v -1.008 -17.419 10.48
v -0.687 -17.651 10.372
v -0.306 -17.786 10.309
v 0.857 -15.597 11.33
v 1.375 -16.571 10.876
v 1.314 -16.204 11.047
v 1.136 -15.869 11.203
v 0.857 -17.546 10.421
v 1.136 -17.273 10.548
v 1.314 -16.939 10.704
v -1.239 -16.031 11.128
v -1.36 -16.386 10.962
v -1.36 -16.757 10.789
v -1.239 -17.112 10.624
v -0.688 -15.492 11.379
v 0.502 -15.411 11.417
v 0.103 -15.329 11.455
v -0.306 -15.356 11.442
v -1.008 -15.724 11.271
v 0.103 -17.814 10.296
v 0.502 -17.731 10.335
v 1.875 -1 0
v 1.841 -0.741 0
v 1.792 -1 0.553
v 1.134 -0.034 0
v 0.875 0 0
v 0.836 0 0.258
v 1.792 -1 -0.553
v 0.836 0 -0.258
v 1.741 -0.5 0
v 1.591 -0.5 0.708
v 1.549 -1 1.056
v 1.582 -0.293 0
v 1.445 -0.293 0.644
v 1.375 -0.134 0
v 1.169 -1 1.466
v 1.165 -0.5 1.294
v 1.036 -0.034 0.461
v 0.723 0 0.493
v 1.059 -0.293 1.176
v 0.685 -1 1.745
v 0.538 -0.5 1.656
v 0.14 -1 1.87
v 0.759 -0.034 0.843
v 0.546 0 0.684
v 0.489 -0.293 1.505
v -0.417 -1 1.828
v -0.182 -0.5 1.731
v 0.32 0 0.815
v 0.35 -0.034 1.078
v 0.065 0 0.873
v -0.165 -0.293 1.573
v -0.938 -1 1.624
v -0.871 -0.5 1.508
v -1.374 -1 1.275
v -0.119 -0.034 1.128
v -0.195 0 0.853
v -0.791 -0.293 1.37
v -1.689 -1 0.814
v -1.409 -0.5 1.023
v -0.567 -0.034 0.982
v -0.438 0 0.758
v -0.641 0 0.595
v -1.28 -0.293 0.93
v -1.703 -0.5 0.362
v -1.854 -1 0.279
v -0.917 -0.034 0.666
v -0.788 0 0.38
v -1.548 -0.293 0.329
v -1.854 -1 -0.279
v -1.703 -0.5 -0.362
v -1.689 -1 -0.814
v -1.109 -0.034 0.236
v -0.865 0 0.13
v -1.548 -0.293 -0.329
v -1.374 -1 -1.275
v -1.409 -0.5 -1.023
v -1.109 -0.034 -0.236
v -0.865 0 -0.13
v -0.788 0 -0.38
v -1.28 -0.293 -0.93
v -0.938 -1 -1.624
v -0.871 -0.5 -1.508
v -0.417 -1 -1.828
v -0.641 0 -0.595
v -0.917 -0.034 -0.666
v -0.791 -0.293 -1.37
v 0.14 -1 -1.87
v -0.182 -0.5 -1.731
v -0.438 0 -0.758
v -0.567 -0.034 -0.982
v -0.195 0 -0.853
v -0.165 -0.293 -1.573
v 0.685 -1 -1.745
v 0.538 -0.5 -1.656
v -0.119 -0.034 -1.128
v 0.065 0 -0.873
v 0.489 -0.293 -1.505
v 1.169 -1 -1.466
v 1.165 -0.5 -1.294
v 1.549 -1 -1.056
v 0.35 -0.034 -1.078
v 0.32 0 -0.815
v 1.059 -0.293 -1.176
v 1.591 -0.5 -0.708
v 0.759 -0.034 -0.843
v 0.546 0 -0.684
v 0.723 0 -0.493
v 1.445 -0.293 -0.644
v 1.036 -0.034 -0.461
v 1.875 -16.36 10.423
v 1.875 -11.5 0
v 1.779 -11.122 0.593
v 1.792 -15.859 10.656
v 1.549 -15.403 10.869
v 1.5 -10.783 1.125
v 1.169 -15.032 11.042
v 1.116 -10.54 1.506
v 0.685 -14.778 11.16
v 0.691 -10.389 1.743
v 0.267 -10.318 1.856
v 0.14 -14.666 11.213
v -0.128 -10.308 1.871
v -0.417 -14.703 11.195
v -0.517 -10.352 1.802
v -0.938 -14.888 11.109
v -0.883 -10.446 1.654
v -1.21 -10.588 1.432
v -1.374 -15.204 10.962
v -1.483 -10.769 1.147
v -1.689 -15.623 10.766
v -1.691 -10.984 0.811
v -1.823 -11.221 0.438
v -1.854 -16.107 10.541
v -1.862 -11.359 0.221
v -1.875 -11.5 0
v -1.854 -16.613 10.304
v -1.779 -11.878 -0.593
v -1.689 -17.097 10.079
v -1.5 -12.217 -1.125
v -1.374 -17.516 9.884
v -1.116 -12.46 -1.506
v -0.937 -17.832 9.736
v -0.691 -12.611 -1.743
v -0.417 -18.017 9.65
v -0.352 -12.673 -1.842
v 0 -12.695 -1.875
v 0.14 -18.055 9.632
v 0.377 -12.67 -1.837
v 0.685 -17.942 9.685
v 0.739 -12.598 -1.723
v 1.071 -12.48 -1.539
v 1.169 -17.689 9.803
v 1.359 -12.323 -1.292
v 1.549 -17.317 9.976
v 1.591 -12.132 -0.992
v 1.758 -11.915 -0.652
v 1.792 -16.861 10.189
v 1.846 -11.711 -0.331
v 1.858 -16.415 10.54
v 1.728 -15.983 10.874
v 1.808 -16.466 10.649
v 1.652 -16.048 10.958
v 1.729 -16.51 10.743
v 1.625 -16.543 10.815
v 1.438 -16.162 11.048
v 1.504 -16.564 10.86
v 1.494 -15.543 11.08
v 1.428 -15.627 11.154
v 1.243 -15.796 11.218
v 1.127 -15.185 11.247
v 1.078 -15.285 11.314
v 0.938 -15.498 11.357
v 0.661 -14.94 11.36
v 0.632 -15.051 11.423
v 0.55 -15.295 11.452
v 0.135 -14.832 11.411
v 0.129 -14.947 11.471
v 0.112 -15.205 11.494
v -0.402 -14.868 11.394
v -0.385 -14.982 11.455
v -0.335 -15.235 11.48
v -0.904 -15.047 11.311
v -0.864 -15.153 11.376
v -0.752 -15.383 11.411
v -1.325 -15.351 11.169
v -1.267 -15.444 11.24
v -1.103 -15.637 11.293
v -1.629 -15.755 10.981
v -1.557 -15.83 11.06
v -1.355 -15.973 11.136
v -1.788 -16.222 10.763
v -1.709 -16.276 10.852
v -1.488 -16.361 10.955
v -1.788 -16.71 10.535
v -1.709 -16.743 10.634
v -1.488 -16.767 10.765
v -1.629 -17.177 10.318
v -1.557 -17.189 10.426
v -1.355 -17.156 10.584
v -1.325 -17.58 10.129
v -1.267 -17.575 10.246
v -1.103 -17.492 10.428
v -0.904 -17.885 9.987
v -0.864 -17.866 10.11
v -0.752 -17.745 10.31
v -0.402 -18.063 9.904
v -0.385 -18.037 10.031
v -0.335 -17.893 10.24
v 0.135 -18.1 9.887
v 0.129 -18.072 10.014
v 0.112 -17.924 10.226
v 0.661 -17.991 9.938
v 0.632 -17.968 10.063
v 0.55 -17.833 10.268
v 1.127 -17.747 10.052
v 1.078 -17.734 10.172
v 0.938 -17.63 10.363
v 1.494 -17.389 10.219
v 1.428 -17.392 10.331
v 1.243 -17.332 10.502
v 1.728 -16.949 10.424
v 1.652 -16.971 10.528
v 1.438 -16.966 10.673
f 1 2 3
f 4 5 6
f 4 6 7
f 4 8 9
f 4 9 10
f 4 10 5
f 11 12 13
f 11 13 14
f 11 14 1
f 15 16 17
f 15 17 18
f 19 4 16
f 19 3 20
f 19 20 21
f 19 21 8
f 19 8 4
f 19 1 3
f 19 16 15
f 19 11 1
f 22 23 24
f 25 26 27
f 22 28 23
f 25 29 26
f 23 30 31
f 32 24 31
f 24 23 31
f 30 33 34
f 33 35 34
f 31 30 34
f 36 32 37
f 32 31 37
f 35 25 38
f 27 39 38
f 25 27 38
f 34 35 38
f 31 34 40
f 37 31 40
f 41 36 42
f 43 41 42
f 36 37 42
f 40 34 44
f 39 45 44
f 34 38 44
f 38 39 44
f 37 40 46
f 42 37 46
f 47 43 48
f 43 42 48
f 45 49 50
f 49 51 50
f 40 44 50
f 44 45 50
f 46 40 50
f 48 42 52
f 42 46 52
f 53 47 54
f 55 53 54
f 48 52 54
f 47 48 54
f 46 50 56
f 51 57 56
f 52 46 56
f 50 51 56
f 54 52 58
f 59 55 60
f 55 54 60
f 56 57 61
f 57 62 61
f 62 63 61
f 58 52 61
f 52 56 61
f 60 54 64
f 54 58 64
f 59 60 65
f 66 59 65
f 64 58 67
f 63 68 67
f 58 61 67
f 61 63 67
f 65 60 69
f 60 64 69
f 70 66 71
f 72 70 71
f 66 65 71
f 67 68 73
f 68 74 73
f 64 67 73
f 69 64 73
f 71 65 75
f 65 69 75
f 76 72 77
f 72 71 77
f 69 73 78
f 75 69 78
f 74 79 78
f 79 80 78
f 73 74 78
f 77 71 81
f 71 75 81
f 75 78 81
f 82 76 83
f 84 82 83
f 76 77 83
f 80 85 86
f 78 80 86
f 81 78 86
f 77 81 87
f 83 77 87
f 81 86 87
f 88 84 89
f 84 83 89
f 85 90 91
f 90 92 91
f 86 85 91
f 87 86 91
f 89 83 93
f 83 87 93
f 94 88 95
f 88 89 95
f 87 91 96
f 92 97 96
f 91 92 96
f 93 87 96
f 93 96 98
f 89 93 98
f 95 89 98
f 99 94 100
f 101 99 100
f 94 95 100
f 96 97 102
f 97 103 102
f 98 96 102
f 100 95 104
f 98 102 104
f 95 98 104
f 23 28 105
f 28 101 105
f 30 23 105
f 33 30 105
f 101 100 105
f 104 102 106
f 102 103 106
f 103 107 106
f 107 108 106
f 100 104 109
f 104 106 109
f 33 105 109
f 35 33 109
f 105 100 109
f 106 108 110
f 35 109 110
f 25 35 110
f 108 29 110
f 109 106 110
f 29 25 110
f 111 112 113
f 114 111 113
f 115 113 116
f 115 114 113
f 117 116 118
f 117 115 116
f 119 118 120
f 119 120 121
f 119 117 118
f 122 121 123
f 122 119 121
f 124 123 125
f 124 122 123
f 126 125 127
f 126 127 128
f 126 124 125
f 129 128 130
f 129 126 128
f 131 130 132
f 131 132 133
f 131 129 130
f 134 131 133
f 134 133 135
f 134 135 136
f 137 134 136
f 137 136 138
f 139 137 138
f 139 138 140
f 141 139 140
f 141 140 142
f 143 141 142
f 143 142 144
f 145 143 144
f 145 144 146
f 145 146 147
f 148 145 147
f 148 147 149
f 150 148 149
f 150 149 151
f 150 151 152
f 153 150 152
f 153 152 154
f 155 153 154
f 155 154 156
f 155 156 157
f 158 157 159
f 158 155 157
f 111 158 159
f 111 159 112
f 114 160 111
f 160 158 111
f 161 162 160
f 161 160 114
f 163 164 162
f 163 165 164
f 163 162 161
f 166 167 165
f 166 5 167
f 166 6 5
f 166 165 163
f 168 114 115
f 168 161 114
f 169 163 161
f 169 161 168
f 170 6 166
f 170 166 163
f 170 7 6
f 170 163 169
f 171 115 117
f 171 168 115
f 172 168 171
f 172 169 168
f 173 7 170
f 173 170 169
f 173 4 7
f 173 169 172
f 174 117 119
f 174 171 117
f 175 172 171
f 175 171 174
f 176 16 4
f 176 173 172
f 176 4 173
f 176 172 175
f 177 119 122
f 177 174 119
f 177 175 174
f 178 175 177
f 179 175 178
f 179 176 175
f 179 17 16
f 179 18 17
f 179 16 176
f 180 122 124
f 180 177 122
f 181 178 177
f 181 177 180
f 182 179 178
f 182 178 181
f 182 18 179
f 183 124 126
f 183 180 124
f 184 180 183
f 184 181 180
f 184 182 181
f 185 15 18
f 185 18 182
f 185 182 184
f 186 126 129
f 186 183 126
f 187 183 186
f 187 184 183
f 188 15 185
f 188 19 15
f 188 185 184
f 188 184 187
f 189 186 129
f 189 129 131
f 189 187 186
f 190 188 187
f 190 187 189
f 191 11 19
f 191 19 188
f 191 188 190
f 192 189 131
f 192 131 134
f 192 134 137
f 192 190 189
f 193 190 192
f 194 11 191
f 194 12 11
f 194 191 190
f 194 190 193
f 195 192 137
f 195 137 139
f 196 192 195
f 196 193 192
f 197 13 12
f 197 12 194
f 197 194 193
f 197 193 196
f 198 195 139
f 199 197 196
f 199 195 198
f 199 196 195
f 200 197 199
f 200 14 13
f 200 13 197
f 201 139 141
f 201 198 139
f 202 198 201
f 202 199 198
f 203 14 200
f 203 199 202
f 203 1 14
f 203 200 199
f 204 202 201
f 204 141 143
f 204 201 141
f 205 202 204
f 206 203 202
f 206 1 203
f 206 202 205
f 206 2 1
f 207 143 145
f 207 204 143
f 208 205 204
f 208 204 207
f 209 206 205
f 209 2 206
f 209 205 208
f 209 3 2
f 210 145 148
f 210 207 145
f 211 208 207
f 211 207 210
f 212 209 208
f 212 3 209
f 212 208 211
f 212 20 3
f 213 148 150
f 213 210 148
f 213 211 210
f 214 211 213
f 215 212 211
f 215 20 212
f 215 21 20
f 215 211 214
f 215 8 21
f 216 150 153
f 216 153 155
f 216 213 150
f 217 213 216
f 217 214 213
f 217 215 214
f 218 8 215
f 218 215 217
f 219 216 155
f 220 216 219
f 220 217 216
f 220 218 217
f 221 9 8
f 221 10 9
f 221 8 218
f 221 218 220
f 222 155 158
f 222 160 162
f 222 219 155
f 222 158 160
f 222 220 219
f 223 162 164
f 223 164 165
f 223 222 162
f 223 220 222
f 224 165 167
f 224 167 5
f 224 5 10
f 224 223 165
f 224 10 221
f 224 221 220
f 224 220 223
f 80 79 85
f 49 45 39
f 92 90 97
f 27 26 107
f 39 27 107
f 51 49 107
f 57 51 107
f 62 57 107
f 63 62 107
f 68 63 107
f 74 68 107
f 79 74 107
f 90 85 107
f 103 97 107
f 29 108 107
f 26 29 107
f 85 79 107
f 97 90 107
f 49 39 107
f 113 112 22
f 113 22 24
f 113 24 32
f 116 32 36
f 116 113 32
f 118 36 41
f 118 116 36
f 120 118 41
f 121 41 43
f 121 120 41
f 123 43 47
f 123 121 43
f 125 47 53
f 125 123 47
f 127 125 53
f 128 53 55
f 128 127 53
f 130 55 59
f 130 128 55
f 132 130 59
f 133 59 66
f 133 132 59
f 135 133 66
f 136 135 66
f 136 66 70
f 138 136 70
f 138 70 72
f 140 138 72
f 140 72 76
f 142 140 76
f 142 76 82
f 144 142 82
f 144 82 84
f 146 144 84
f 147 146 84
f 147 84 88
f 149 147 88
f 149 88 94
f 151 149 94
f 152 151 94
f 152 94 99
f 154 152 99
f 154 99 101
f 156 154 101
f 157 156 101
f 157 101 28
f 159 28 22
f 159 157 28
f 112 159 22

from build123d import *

# Parameters (mm, degrees)
F0_R = 1.875
F3_R = 1
F4_R = 0.5


with BuildPart() as f2:
    # F2: sweep along a path in F1
    with BuildLine(Plane.YZ) as f2_path:
        Line((0, 0), (-11.5, 0))
        Line((-11.5, 0), (-16.5714191409, 10.8756934444))
    # F0 (on Front) → F2 (sweep)
    with BuildSketch(Plane.XZ):
        Circle(F0_R)
    sweep(path=f2_path.line, transition=Transition.RIGHT)

    # F3
    f3_edges = [f2.edges().sort_by_distance(p)[0] for p in [
        (-1.875, 0, 0),
    ]]
    fillet(f3_edges, radius=F3_R)

    # F4
    f4_edges = [f2.edges().sort_by_distance(p)[0] for p in [
        (-1.875, -16.571419, 10.875693),
    ]]
    fillet(f4_edges, radius=F4_R)


solid = f2.part
